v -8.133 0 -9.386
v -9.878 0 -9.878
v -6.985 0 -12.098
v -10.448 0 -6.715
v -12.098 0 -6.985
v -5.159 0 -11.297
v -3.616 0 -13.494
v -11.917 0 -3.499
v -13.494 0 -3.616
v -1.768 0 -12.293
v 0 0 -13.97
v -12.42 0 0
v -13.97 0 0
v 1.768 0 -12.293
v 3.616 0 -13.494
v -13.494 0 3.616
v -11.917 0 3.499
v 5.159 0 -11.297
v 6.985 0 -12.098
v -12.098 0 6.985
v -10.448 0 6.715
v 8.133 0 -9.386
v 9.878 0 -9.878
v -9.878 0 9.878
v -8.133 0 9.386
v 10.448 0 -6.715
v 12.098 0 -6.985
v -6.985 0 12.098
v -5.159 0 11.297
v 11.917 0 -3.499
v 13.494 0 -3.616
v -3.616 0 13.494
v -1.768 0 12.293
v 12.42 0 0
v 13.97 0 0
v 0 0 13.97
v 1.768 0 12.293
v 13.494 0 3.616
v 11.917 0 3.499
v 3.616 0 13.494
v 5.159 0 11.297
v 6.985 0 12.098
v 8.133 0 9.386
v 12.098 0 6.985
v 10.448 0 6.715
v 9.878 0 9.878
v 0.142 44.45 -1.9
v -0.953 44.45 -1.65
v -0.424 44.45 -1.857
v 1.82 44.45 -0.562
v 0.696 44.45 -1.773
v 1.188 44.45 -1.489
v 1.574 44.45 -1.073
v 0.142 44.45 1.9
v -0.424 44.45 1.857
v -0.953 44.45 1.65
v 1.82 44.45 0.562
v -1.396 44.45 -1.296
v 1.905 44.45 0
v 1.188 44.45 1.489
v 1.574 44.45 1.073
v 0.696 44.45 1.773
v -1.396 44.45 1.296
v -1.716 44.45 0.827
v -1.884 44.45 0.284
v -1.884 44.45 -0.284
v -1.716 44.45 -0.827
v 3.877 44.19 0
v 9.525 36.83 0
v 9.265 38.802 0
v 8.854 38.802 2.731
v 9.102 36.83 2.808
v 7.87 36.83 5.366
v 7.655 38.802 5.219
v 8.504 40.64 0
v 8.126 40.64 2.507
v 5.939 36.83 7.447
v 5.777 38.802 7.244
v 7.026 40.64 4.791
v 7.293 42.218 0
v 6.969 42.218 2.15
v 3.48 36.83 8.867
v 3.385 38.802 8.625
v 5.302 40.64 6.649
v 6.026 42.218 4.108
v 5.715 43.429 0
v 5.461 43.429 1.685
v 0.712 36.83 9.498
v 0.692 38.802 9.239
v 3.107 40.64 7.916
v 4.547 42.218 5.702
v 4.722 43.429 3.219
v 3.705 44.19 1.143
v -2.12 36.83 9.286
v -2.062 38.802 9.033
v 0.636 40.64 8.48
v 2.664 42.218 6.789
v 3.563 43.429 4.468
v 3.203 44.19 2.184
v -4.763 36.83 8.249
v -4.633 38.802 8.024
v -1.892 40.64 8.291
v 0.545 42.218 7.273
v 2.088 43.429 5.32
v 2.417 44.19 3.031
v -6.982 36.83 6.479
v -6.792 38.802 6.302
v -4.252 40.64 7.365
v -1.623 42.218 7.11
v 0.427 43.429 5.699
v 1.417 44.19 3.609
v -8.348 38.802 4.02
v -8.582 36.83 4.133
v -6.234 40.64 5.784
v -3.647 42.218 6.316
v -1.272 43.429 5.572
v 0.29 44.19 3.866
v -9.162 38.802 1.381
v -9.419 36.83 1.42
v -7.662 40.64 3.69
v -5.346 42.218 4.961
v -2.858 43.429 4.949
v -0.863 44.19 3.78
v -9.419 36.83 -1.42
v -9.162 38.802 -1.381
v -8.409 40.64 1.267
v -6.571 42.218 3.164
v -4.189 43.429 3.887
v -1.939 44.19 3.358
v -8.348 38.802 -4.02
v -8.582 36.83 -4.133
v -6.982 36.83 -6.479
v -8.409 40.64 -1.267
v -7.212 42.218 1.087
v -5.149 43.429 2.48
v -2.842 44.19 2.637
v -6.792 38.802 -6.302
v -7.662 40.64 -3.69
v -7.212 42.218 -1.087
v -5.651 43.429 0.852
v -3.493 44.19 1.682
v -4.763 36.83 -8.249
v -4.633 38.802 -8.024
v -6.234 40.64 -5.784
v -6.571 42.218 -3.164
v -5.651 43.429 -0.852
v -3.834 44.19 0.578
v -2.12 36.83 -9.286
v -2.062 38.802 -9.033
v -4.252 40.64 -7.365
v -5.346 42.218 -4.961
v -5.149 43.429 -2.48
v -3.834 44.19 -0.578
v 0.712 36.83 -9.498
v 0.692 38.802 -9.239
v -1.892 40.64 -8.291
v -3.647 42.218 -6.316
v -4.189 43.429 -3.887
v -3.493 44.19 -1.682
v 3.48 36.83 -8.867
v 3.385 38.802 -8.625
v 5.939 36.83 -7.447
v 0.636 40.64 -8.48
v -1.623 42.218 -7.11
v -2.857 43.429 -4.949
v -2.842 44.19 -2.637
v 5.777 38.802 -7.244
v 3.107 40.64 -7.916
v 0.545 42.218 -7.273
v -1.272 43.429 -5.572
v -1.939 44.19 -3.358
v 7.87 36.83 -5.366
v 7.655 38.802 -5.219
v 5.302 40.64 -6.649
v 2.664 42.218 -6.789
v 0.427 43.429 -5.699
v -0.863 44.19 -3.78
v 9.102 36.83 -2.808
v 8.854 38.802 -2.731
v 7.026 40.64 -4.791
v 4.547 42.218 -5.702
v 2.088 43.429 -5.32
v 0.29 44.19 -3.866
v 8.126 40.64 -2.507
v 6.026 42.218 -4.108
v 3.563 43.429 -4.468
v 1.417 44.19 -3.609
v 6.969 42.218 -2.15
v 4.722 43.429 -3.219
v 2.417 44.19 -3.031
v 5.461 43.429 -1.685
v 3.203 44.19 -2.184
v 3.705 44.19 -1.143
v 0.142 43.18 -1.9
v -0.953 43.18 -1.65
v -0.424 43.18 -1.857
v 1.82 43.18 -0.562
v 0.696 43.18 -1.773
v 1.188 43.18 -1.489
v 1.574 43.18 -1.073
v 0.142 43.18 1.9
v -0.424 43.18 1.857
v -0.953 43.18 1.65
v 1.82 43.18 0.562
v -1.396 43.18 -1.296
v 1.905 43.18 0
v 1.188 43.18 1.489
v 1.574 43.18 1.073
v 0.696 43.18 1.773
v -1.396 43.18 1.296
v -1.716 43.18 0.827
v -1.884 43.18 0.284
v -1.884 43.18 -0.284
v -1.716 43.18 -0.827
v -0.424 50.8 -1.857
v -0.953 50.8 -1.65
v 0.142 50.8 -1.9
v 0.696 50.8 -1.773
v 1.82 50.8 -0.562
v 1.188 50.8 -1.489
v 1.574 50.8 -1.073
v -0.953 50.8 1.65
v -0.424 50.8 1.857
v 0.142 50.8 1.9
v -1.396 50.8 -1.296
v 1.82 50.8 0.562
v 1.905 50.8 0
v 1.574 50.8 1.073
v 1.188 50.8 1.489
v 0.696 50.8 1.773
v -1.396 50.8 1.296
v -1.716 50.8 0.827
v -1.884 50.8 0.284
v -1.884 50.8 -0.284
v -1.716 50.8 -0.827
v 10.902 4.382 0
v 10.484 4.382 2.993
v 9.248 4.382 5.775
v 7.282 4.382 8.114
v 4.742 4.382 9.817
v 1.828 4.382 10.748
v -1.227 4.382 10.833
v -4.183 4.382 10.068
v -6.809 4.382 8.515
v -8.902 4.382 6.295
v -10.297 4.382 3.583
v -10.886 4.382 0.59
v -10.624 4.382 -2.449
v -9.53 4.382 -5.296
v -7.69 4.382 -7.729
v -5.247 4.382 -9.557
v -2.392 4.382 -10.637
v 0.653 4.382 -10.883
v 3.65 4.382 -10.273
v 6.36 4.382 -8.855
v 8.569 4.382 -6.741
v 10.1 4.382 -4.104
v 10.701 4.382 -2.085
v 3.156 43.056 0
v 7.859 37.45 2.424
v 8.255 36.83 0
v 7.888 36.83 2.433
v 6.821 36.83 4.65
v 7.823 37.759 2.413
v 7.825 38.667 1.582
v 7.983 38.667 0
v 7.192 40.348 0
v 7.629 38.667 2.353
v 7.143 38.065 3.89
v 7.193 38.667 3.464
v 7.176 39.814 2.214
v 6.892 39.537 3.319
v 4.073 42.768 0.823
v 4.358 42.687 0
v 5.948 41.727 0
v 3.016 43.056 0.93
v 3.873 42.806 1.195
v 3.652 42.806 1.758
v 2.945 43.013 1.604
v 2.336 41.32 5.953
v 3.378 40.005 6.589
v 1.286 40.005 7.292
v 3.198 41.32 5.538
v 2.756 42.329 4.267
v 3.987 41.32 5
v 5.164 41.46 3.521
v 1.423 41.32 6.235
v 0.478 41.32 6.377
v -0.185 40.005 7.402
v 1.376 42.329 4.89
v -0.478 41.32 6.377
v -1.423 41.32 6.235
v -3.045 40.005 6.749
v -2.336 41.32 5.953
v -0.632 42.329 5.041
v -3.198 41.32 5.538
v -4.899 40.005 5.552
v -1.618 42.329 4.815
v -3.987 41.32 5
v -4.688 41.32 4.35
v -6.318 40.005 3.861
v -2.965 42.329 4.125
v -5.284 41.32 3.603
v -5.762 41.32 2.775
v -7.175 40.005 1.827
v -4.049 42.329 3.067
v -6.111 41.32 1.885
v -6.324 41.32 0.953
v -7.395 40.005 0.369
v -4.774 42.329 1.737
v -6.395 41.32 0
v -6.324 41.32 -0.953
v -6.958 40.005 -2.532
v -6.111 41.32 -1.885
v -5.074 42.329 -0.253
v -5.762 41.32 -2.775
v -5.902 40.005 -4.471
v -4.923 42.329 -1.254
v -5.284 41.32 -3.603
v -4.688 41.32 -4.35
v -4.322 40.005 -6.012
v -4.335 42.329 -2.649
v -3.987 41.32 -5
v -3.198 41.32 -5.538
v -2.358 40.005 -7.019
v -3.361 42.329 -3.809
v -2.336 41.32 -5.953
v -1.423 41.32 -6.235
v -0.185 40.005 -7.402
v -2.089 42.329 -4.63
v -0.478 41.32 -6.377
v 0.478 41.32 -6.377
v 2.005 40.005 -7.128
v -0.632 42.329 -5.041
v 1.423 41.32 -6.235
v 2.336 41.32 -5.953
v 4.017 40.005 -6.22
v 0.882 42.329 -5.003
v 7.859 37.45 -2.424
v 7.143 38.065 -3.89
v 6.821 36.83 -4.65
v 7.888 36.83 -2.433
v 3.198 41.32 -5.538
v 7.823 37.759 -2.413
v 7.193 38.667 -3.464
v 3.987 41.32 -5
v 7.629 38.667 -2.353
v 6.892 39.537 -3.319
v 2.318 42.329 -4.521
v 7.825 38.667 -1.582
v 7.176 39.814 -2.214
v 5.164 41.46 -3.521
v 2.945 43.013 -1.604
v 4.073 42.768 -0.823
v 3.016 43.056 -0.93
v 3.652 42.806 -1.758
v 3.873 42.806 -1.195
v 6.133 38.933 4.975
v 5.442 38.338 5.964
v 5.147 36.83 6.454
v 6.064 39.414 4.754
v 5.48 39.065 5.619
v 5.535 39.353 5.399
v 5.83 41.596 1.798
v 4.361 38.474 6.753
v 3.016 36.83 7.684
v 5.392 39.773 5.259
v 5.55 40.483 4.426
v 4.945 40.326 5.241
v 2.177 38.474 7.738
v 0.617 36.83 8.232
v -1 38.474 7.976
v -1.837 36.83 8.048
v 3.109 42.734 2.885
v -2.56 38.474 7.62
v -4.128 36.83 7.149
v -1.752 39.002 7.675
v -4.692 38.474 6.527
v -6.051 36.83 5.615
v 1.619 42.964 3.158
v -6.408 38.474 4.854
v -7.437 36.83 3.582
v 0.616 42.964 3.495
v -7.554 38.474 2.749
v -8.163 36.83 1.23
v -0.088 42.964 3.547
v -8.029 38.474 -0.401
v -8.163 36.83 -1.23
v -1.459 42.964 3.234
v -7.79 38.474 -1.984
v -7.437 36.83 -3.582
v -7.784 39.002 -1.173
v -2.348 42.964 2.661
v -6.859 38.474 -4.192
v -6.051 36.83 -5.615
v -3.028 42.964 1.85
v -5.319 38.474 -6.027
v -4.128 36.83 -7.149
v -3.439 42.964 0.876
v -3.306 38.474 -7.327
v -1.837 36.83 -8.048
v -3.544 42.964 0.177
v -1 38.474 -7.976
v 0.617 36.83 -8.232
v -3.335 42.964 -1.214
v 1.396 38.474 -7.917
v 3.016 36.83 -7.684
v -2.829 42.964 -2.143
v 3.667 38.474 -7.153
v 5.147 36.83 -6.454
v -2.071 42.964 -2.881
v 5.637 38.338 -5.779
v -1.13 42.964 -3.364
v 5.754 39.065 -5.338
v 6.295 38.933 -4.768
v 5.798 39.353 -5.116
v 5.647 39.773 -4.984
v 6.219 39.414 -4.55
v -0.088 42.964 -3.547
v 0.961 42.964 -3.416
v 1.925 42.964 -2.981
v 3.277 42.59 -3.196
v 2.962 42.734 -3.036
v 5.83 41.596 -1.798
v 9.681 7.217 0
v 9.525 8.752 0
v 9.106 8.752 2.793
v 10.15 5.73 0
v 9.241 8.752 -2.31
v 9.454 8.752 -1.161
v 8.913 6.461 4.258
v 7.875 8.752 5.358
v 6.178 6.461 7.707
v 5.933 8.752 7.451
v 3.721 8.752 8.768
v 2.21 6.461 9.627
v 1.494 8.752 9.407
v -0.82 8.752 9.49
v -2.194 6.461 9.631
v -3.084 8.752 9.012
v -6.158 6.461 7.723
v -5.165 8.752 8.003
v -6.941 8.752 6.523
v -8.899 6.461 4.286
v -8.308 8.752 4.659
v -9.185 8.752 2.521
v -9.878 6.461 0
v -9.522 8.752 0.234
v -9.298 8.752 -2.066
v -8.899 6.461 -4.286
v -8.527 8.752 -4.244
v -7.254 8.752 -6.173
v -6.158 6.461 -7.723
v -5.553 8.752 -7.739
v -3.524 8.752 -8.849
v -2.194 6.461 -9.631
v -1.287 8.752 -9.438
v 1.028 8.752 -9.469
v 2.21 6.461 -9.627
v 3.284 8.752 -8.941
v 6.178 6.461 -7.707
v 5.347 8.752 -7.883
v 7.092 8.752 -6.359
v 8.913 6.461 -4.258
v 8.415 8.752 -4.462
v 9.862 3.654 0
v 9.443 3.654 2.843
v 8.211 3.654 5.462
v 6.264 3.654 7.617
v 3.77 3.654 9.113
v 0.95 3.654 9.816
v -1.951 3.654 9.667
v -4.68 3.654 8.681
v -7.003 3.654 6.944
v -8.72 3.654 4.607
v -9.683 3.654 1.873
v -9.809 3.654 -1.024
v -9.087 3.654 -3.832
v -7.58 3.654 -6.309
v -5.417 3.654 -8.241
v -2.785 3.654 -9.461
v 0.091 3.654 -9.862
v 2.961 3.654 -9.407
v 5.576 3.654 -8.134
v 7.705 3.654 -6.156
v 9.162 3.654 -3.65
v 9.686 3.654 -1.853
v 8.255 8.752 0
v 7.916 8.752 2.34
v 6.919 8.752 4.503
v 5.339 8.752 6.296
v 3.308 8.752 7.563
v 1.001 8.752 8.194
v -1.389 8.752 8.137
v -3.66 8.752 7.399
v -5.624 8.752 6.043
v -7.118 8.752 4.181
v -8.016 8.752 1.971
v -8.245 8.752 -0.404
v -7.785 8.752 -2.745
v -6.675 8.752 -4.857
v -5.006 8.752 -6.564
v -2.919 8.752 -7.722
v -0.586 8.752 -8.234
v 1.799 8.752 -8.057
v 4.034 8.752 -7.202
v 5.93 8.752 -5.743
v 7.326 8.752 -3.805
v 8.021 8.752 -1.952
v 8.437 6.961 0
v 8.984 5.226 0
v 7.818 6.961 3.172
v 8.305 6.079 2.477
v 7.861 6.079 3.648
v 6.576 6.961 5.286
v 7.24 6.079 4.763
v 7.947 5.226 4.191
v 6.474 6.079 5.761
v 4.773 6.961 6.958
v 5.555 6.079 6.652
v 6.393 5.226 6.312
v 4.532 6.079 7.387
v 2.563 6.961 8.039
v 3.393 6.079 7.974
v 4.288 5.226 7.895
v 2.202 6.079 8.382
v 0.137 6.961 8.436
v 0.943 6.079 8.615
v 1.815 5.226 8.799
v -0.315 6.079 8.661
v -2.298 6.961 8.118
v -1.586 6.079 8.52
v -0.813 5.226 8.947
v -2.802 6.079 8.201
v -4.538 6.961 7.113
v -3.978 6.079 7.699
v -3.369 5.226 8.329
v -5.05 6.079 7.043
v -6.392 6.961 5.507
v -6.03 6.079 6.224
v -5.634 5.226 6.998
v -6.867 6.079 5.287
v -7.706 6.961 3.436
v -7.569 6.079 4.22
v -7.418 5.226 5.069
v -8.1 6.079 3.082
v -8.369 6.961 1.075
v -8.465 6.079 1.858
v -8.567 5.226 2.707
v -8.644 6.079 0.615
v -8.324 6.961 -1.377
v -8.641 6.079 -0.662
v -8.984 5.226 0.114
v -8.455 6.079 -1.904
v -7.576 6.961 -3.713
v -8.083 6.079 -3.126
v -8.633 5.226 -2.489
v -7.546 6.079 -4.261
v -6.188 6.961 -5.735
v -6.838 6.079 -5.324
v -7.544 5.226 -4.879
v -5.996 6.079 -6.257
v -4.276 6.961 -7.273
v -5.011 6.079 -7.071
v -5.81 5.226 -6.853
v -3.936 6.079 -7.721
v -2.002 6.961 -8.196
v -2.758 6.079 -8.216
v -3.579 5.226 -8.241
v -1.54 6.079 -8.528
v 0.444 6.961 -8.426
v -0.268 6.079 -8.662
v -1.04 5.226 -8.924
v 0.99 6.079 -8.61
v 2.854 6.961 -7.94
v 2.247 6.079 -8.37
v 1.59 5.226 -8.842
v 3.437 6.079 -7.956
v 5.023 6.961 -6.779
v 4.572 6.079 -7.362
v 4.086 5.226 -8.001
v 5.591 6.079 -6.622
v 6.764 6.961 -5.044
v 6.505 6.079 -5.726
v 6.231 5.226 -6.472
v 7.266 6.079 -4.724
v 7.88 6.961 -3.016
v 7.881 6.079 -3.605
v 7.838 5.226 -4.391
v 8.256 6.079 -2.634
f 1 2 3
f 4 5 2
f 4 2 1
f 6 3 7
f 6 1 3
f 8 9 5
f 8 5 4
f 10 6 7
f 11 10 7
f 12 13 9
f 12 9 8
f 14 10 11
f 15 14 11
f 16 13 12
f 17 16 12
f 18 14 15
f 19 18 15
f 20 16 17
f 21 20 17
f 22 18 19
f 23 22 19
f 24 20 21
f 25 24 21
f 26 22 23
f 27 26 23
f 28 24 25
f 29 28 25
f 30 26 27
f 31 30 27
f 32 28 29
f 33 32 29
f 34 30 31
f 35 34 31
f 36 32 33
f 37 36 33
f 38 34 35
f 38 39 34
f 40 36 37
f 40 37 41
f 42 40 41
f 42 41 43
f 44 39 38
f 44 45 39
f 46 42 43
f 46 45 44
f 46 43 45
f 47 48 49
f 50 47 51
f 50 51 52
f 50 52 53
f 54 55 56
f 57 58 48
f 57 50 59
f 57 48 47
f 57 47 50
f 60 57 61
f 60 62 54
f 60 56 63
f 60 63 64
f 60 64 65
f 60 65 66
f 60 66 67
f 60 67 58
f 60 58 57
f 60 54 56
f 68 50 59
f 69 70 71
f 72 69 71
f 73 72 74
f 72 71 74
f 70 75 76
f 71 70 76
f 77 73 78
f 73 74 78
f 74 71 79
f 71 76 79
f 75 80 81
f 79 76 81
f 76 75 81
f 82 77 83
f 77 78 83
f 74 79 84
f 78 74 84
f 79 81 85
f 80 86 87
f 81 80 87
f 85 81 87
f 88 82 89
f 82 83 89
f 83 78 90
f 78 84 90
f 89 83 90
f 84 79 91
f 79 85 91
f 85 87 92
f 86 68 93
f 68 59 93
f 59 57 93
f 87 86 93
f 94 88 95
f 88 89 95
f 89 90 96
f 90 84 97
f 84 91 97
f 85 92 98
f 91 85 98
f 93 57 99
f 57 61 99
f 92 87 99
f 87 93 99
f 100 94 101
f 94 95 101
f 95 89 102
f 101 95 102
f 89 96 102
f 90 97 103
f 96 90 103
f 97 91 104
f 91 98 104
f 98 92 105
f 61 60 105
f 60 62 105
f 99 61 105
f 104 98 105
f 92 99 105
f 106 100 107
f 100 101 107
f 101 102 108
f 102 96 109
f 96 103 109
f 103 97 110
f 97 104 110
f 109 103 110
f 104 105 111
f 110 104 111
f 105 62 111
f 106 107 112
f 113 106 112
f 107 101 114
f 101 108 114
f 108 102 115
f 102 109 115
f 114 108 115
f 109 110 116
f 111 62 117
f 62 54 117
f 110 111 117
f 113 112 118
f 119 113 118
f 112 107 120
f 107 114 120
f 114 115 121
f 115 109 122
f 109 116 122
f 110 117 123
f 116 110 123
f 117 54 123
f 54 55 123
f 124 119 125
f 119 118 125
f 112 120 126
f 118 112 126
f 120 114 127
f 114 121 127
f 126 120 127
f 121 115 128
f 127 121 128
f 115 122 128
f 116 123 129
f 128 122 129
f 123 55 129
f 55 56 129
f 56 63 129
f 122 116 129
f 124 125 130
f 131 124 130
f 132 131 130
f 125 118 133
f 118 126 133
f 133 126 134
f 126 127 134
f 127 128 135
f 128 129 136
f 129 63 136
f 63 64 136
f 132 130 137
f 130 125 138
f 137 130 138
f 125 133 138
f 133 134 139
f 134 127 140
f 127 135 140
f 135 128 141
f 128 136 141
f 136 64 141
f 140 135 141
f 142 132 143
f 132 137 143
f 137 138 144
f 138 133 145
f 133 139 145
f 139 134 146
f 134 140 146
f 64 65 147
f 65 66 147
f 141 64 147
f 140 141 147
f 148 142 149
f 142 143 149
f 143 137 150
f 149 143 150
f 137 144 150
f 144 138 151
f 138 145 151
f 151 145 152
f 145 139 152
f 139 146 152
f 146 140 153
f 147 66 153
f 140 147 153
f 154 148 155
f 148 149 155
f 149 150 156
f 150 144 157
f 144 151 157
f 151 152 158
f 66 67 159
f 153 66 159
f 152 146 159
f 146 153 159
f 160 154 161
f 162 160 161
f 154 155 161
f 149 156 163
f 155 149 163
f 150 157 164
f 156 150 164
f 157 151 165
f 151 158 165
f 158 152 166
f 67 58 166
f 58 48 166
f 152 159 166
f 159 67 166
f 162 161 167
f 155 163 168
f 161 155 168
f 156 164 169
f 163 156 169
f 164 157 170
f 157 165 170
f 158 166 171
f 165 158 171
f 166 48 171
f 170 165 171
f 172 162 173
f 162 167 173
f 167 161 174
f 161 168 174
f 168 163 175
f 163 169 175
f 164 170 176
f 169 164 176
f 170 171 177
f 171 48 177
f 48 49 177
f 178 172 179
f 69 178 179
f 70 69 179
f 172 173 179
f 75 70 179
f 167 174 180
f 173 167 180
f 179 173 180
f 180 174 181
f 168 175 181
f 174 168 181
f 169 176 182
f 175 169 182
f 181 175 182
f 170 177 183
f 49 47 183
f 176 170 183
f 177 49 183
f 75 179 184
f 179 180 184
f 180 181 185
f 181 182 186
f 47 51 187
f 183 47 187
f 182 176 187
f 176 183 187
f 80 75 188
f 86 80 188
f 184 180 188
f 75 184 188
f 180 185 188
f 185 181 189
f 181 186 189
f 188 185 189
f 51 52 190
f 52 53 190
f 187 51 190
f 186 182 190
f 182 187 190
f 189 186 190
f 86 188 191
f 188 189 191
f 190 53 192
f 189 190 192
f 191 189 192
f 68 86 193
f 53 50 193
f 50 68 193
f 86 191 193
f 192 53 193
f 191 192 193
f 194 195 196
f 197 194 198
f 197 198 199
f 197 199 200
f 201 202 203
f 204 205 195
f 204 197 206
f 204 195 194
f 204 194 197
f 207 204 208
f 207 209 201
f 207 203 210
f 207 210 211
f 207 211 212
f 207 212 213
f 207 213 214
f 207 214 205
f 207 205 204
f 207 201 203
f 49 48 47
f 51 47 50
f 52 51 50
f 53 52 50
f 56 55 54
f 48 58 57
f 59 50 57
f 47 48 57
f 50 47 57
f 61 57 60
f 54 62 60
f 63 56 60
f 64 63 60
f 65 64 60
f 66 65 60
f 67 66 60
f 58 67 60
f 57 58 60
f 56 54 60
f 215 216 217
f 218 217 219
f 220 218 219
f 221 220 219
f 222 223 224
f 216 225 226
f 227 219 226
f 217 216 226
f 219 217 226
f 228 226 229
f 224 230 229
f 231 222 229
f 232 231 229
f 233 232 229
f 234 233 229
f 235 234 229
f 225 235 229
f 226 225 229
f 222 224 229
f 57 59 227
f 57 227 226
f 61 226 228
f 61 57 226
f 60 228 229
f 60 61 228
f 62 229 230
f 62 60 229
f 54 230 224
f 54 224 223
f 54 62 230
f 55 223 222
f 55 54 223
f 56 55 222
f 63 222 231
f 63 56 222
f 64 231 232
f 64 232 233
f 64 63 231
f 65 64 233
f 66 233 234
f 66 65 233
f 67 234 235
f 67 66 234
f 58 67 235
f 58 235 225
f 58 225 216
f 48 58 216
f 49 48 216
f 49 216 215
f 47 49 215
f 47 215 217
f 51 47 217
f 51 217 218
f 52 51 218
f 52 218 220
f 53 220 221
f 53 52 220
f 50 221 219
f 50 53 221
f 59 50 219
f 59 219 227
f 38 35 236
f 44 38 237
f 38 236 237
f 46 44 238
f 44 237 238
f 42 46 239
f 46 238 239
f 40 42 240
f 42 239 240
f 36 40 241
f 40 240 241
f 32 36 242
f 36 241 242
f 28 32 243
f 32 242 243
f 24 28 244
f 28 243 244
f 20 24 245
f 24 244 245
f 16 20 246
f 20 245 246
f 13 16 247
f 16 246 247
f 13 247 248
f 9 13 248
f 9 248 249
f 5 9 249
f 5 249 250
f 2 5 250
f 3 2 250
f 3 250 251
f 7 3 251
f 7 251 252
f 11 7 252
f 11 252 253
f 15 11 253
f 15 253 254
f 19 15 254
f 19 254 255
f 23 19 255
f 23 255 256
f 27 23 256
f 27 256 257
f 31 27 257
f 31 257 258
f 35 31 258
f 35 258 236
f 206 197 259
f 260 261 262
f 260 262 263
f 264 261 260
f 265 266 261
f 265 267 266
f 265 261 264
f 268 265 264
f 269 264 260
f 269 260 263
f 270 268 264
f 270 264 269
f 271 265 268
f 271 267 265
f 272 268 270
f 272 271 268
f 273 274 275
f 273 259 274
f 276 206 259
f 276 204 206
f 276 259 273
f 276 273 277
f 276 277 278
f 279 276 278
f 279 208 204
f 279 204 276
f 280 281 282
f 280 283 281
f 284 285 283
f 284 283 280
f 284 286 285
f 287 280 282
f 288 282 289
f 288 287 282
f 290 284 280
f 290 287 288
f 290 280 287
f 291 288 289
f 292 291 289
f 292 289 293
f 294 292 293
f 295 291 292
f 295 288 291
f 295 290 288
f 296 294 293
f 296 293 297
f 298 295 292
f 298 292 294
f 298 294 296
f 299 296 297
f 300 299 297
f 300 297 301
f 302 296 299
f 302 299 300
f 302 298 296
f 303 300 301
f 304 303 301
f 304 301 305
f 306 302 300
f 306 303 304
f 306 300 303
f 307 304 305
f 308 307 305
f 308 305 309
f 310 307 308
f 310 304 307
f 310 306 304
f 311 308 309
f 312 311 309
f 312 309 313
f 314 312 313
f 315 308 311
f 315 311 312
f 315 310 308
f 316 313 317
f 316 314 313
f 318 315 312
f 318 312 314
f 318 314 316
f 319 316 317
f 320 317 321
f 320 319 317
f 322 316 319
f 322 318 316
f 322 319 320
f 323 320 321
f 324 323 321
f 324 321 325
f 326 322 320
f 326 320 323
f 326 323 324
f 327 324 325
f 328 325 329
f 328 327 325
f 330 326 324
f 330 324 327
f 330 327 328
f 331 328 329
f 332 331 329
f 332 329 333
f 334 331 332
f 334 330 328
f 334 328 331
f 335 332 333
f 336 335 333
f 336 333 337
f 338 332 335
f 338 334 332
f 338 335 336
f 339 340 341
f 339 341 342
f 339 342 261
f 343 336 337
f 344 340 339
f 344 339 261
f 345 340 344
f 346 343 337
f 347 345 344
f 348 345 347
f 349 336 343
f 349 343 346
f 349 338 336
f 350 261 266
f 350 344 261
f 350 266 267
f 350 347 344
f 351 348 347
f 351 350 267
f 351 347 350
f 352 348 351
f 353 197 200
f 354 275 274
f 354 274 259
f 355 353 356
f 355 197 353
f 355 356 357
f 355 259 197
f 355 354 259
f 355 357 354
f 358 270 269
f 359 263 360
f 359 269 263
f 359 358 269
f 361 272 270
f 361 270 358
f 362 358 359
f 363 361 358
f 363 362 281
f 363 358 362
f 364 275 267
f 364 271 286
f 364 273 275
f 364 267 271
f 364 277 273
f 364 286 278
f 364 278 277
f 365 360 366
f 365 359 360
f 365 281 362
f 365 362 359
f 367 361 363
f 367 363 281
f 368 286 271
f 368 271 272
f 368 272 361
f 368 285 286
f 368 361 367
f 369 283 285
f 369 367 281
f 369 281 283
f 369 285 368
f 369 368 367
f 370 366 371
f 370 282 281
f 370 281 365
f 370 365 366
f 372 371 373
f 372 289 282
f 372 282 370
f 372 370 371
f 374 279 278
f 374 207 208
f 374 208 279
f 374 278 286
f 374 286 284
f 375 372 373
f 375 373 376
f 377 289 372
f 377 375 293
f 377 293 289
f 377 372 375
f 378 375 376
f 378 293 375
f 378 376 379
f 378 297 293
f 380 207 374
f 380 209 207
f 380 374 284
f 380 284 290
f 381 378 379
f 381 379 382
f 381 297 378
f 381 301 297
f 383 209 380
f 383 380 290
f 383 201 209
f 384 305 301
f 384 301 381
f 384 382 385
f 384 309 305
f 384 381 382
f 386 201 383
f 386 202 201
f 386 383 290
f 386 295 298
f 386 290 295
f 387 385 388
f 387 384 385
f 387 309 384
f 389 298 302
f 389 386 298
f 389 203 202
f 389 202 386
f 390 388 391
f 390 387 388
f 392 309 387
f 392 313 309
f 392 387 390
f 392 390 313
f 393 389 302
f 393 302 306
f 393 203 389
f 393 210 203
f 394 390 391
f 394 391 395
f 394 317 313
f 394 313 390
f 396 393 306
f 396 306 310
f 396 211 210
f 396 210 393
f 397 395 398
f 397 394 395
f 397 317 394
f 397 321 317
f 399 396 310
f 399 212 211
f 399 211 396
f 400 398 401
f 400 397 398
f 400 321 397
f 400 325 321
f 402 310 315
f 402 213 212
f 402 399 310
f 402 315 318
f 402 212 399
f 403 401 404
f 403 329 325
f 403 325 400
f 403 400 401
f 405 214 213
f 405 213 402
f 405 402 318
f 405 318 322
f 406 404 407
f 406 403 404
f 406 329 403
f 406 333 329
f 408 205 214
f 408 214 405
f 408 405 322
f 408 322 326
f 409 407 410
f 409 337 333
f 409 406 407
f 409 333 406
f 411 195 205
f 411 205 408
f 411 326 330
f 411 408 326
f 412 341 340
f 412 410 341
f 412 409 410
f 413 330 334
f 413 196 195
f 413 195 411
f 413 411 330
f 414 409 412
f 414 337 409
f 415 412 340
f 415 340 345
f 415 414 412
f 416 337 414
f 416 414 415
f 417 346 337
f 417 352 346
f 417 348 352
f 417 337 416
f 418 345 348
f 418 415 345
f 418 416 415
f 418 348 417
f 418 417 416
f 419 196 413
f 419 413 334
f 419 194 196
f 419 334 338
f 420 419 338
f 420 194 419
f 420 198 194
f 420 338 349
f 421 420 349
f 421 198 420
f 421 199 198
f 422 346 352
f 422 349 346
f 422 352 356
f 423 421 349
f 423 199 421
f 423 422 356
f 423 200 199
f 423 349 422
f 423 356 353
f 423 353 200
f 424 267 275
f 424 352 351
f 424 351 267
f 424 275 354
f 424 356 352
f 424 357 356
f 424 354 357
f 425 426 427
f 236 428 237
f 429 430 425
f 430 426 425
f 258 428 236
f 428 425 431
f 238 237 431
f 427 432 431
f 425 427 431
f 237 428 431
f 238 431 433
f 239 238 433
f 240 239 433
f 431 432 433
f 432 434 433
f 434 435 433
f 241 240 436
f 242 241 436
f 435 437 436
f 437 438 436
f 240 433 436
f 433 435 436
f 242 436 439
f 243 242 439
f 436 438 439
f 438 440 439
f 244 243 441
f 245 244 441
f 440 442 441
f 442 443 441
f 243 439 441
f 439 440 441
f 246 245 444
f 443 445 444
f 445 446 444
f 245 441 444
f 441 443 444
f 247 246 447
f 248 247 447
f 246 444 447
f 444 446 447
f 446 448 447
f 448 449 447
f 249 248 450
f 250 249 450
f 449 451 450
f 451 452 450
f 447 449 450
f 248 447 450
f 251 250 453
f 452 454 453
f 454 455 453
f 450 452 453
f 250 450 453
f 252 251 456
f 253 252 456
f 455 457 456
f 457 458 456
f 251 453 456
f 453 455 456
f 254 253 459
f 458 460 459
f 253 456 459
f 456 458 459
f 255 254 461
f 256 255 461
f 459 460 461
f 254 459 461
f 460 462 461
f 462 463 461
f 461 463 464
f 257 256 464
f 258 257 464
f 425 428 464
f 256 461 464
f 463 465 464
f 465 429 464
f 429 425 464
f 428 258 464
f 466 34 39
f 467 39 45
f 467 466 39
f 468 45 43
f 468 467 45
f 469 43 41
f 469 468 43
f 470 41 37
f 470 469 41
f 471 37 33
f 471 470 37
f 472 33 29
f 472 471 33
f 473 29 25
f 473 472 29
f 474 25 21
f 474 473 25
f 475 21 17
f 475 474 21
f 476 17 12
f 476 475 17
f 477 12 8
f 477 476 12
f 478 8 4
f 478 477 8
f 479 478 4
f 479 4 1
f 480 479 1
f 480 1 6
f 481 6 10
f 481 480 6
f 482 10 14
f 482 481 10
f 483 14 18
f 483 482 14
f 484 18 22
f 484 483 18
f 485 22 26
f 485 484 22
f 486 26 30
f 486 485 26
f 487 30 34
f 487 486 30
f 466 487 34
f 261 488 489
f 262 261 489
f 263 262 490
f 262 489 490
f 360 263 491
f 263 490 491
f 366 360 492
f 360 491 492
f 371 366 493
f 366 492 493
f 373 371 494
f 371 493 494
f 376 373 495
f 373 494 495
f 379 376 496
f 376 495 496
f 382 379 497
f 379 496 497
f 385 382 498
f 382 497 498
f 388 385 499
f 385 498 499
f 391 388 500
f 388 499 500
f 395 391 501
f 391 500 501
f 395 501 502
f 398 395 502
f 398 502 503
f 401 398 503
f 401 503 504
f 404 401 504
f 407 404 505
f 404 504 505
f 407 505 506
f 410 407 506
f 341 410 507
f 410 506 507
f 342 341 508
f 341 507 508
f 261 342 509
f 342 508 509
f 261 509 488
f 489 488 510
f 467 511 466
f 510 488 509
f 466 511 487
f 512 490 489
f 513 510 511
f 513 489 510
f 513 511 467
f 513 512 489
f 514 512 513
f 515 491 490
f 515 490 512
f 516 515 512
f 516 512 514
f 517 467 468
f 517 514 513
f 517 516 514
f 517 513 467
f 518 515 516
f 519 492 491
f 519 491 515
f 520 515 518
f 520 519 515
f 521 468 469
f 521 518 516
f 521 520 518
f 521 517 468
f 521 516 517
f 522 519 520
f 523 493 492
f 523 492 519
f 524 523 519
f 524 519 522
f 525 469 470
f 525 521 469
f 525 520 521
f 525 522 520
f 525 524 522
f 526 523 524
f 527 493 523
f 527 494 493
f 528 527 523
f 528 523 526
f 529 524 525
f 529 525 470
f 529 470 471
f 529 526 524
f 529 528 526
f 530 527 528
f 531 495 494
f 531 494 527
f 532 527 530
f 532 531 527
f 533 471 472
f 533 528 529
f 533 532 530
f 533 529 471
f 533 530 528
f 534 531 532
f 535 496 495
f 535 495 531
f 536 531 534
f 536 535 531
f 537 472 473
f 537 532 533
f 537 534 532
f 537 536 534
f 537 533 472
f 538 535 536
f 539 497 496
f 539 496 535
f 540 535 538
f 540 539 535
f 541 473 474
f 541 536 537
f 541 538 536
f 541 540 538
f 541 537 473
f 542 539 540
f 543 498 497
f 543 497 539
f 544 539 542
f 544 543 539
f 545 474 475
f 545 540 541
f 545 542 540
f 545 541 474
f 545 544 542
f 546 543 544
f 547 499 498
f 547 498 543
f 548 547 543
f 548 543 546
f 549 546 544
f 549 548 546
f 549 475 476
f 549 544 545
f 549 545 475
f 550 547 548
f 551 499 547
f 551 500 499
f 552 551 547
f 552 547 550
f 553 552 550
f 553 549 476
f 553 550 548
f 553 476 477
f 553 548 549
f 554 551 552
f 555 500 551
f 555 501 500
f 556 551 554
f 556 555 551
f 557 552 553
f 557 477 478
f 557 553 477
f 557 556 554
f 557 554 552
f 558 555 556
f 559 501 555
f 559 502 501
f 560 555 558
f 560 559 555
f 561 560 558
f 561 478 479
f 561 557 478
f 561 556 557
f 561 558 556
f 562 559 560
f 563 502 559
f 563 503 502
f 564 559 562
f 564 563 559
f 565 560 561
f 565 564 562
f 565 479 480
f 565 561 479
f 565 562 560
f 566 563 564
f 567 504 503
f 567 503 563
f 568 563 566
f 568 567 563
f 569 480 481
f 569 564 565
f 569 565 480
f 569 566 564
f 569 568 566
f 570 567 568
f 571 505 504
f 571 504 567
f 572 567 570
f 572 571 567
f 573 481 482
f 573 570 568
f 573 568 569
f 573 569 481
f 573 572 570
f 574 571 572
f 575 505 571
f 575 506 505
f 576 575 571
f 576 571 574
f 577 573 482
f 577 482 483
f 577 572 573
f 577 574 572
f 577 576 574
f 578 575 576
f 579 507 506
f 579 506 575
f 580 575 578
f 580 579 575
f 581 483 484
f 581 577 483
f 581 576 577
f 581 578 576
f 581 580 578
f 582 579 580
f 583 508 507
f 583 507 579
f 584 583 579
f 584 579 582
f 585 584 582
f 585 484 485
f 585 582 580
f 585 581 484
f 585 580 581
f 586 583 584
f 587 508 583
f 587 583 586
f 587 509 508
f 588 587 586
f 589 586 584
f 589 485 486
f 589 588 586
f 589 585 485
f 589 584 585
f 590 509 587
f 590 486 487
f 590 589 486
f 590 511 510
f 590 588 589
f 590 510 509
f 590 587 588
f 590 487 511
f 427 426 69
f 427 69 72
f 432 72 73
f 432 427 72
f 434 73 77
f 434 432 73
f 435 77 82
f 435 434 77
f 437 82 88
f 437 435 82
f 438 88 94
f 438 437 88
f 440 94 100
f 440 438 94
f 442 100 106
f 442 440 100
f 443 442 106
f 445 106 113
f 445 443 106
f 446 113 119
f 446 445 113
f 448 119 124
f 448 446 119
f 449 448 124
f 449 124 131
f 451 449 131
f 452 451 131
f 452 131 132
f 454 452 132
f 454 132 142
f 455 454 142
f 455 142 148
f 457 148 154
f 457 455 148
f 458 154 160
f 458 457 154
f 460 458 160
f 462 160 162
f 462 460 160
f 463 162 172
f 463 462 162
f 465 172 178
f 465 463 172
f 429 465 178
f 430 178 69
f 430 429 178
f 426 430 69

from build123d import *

# Parameters (mm, degrees)
F0_R     = 13.97
F2_R     = 9.525
F4_DEPTH = 38.1
F5_R     = 7.62
F6_R     = 7.62
F7_DEPTH = 6.35
F8_T     = -1.27


with BuildPart() as f3:
    # F0 (on Front) → F3 section 0
    with BuildSketch(Plane.XZ):
        Circle(F0_R)
    # F2 (on offset) → F3 section 1
    with BuildSketch(Plane.XZ.offset(-6.35)):
        Circle(F2_R)
    loft()

    # F2 (on offset) → F4 (join)
    with BuildSketch(Plane.XZ.offset(-6.35)):
        Circle(F2_R)
    extrude(amount=-F4_DEPTH)

    # F5
    f5_edges = [f3.edges().sort_by_distance(p)[0] for p in [
        (-9.525, 6.35, 0),
    ]]
    fillet(f5_edges, radius=F5_R)

    # F6
    f6_edges = [f3.edges().sort_by_distance(p)[0] for p in [
        (-9.525, 44.45, 0),
    ]]
    fillet(f6_edges, radius=F6_R)


with BuildPart() as f7:
    # F7 (new): a face of the model
    f7_faces = [f3.part.faces().sort_by_distance(p)[0] for p in [
        (0, 44.45, 0),
    ]]
    extrude(f7_faces, amount=F7_DEPTH)


with BuildPart() as f3_1:
    add(f3.part)

    # F8
    f8_openings = [f3_1.faces().sort_by_distance(p)[0] for p in [
        (0, 0, 0),
    ]]
    offset(amount=F8_T, openings=f8_openings, kind=Kind.INTERSECTION)


solid = Compound([f7.part, f3_1.part])
